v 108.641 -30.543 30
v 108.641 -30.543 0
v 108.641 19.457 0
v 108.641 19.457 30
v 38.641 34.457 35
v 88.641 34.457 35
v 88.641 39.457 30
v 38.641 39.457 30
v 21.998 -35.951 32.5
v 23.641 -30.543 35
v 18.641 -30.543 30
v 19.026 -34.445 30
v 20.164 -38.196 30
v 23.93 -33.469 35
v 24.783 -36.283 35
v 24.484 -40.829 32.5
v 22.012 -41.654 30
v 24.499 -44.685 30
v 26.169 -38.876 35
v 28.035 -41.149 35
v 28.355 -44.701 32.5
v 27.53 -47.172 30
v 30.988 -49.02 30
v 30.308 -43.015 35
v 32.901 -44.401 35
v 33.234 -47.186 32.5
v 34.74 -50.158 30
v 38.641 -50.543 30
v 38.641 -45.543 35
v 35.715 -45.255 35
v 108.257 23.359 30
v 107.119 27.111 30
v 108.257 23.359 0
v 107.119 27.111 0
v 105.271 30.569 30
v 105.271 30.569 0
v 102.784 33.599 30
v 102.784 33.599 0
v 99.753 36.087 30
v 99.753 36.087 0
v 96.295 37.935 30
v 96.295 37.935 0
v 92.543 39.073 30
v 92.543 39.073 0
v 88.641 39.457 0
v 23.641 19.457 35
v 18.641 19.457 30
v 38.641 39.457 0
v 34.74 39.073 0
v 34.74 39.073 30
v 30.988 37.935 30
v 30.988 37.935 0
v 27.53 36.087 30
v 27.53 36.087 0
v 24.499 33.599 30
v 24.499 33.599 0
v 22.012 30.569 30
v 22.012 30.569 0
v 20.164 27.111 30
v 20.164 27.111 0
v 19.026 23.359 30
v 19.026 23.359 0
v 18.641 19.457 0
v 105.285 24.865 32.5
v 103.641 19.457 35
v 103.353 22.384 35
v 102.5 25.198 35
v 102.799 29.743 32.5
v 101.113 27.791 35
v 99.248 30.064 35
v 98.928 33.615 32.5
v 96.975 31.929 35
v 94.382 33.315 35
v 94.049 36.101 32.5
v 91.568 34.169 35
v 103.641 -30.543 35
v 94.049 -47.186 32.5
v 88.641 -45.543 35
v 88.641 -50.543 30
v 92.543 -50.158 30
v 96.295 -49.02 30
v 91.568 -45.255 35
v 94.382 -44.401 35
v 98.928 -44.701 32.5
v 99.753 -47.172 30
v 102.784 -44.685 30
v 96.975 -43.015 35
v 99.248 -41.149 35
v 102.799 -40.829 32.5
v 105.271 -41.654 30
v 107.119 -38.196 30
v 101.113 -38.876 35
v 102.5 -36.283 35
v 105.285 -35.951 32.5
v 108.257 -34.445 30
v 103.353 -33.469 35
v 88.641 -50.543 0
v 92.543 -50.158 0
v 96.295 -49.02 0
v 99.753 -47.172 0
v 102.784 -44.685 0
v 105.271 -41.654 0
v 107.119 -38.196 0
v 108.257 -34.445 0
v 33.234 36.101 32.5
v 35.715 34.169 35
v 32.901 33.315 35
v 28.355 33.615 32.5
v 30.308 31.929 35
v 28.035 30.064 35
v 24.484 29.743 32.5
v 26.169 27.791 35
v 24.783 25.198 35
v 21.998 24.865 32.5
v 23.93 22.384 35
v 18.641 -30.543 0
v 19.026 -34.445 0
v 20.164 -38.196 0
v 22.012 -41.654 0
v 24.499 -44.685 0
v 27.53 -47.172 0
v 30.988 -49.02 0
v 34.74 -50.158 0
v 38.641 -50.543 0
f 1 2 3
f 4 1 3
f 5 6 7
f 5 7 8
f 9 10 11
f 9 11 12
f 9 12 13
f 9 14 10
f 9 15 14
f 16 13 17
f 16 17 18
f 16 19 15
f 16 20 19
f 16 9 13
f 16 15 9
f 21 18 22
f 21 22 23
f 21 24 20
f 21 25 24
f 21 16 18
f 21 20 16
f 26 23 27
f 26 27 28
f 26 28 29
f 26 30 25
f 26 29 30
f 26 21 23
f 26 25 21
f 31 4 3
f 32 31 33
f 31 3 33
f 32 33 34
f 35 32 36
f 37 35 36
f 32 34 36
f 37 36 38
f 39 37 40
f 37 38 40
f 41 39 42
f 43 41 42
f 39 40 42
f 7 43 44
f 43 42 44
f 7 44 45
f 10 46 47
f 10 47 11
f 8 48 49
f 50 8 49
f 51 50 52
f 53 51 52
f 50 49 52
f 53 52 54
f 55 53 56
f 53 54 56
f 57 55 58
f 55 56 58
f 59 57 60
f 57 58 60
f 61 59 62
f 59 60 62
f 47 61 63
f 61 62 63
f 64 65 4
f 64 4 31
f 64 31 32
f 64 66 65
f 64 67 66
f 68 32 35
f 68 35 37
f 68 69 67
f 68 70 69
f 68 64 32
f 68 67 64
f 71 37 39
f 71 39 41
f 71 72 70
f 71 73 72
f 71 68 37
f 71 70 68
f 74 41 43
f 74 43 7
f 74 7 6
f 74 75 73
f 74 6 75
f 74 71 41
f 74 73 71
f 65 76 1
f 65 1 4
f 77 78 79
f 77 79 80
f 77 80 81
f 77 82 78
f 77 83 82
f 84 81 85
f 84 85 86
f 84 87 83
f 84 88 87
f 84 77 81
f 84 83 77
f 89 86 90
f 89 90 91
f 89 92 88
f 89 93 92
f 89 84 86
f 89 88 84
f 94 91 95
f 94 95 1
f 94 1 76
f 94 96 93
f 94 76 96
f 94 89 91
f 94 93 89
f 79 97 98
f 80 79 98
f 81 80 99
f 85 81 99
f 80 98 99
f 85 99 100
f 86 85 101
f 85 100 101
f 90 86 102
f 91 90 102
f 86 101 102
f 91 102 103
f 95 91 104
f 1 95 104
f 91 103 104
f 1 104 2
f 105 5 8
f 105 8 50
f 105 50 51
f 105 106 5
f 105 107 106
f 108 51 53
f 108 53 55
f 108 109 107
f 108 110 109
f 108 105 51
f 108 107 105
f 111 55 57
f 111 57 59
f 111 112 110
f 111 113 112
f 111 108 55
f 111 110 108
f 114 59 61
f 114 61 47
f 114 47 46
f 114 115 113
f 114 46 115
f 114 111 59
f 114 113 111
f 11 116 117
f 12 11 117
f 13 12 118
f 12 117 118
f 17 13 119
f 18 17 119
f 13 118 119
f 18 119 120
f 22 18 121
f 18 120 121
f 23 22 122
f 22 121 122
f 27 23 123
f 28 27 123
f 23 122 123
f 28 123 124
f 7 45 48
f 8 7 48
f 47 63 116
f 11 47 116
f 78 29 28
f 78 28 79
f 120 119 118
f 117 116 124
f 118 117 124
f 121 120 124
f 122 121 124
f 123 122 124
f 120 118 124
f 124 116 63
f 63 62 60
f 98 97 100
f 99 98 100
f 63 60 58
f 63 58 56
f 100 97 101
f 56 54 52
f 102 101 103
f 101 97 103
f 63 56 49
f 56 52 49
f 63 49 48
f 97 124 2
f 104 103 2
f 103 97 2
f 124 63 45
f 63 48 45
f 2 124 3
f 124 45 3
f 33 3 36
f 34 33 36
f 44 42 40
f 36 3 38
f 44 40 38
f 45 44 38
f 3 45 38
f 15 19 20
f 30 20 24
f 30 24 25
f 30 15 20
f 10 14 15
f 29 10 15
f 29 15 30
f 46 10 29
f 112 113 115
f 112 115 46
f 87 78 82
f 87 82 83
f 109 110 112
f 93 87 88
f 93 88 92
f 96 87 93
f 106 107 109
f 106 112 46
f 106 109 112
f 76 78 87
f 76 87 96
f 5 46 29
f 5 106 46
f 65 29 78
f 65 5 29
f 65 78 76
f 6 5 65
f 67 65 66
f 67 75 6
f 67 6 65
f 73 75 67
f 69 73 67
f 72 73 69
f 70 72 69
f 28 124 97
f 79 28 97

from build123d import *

# Parameters (mm, degrees)
F1_DEPTH = 35
F2_SIZE  = 5


with BuildPart() as f1:
    # F0 (on Top) → F1 (new body)
    with BuildSketch(Plane.XY):
        with BuildLine():
            Line((88.641453, 39.457253), (38.641453, 39.457253))
            ThreePointArc((38.641453, 39.457253), (24.499317, 33.599388), (18.641453, 19.457253))
            Line((18.641453, 19.457253), (18.641453, -30.542747))
            ThreePointArc((18.641453, -30.542747), (24.499317, -44.684883), (38.641453, -50.542747))
            Line((38.641453, -50.542747), (88.641453, -50.542747))
            ThreePointArc((88.641453, -50.542747), (102.783589, -44.684883), (108.641453, -30.542747))
            Line((108.641453, -30.542747), (108.641453, 19.457253))
            ThreePointArc((108.641453, 19.457253), (102.783589, 33.599388), (88.641453, 39.457253))
        make_face()
    extrude(amount=F1_DEPTH)

    # F2
    f2_edges = [f1.edges().sort_by_distance(p)[0] for p in [
        (18.641453, -5.542747, 35),
    ]]
    chamfer(f2_edges, length=F2_SIZE)


solid = f1.part
